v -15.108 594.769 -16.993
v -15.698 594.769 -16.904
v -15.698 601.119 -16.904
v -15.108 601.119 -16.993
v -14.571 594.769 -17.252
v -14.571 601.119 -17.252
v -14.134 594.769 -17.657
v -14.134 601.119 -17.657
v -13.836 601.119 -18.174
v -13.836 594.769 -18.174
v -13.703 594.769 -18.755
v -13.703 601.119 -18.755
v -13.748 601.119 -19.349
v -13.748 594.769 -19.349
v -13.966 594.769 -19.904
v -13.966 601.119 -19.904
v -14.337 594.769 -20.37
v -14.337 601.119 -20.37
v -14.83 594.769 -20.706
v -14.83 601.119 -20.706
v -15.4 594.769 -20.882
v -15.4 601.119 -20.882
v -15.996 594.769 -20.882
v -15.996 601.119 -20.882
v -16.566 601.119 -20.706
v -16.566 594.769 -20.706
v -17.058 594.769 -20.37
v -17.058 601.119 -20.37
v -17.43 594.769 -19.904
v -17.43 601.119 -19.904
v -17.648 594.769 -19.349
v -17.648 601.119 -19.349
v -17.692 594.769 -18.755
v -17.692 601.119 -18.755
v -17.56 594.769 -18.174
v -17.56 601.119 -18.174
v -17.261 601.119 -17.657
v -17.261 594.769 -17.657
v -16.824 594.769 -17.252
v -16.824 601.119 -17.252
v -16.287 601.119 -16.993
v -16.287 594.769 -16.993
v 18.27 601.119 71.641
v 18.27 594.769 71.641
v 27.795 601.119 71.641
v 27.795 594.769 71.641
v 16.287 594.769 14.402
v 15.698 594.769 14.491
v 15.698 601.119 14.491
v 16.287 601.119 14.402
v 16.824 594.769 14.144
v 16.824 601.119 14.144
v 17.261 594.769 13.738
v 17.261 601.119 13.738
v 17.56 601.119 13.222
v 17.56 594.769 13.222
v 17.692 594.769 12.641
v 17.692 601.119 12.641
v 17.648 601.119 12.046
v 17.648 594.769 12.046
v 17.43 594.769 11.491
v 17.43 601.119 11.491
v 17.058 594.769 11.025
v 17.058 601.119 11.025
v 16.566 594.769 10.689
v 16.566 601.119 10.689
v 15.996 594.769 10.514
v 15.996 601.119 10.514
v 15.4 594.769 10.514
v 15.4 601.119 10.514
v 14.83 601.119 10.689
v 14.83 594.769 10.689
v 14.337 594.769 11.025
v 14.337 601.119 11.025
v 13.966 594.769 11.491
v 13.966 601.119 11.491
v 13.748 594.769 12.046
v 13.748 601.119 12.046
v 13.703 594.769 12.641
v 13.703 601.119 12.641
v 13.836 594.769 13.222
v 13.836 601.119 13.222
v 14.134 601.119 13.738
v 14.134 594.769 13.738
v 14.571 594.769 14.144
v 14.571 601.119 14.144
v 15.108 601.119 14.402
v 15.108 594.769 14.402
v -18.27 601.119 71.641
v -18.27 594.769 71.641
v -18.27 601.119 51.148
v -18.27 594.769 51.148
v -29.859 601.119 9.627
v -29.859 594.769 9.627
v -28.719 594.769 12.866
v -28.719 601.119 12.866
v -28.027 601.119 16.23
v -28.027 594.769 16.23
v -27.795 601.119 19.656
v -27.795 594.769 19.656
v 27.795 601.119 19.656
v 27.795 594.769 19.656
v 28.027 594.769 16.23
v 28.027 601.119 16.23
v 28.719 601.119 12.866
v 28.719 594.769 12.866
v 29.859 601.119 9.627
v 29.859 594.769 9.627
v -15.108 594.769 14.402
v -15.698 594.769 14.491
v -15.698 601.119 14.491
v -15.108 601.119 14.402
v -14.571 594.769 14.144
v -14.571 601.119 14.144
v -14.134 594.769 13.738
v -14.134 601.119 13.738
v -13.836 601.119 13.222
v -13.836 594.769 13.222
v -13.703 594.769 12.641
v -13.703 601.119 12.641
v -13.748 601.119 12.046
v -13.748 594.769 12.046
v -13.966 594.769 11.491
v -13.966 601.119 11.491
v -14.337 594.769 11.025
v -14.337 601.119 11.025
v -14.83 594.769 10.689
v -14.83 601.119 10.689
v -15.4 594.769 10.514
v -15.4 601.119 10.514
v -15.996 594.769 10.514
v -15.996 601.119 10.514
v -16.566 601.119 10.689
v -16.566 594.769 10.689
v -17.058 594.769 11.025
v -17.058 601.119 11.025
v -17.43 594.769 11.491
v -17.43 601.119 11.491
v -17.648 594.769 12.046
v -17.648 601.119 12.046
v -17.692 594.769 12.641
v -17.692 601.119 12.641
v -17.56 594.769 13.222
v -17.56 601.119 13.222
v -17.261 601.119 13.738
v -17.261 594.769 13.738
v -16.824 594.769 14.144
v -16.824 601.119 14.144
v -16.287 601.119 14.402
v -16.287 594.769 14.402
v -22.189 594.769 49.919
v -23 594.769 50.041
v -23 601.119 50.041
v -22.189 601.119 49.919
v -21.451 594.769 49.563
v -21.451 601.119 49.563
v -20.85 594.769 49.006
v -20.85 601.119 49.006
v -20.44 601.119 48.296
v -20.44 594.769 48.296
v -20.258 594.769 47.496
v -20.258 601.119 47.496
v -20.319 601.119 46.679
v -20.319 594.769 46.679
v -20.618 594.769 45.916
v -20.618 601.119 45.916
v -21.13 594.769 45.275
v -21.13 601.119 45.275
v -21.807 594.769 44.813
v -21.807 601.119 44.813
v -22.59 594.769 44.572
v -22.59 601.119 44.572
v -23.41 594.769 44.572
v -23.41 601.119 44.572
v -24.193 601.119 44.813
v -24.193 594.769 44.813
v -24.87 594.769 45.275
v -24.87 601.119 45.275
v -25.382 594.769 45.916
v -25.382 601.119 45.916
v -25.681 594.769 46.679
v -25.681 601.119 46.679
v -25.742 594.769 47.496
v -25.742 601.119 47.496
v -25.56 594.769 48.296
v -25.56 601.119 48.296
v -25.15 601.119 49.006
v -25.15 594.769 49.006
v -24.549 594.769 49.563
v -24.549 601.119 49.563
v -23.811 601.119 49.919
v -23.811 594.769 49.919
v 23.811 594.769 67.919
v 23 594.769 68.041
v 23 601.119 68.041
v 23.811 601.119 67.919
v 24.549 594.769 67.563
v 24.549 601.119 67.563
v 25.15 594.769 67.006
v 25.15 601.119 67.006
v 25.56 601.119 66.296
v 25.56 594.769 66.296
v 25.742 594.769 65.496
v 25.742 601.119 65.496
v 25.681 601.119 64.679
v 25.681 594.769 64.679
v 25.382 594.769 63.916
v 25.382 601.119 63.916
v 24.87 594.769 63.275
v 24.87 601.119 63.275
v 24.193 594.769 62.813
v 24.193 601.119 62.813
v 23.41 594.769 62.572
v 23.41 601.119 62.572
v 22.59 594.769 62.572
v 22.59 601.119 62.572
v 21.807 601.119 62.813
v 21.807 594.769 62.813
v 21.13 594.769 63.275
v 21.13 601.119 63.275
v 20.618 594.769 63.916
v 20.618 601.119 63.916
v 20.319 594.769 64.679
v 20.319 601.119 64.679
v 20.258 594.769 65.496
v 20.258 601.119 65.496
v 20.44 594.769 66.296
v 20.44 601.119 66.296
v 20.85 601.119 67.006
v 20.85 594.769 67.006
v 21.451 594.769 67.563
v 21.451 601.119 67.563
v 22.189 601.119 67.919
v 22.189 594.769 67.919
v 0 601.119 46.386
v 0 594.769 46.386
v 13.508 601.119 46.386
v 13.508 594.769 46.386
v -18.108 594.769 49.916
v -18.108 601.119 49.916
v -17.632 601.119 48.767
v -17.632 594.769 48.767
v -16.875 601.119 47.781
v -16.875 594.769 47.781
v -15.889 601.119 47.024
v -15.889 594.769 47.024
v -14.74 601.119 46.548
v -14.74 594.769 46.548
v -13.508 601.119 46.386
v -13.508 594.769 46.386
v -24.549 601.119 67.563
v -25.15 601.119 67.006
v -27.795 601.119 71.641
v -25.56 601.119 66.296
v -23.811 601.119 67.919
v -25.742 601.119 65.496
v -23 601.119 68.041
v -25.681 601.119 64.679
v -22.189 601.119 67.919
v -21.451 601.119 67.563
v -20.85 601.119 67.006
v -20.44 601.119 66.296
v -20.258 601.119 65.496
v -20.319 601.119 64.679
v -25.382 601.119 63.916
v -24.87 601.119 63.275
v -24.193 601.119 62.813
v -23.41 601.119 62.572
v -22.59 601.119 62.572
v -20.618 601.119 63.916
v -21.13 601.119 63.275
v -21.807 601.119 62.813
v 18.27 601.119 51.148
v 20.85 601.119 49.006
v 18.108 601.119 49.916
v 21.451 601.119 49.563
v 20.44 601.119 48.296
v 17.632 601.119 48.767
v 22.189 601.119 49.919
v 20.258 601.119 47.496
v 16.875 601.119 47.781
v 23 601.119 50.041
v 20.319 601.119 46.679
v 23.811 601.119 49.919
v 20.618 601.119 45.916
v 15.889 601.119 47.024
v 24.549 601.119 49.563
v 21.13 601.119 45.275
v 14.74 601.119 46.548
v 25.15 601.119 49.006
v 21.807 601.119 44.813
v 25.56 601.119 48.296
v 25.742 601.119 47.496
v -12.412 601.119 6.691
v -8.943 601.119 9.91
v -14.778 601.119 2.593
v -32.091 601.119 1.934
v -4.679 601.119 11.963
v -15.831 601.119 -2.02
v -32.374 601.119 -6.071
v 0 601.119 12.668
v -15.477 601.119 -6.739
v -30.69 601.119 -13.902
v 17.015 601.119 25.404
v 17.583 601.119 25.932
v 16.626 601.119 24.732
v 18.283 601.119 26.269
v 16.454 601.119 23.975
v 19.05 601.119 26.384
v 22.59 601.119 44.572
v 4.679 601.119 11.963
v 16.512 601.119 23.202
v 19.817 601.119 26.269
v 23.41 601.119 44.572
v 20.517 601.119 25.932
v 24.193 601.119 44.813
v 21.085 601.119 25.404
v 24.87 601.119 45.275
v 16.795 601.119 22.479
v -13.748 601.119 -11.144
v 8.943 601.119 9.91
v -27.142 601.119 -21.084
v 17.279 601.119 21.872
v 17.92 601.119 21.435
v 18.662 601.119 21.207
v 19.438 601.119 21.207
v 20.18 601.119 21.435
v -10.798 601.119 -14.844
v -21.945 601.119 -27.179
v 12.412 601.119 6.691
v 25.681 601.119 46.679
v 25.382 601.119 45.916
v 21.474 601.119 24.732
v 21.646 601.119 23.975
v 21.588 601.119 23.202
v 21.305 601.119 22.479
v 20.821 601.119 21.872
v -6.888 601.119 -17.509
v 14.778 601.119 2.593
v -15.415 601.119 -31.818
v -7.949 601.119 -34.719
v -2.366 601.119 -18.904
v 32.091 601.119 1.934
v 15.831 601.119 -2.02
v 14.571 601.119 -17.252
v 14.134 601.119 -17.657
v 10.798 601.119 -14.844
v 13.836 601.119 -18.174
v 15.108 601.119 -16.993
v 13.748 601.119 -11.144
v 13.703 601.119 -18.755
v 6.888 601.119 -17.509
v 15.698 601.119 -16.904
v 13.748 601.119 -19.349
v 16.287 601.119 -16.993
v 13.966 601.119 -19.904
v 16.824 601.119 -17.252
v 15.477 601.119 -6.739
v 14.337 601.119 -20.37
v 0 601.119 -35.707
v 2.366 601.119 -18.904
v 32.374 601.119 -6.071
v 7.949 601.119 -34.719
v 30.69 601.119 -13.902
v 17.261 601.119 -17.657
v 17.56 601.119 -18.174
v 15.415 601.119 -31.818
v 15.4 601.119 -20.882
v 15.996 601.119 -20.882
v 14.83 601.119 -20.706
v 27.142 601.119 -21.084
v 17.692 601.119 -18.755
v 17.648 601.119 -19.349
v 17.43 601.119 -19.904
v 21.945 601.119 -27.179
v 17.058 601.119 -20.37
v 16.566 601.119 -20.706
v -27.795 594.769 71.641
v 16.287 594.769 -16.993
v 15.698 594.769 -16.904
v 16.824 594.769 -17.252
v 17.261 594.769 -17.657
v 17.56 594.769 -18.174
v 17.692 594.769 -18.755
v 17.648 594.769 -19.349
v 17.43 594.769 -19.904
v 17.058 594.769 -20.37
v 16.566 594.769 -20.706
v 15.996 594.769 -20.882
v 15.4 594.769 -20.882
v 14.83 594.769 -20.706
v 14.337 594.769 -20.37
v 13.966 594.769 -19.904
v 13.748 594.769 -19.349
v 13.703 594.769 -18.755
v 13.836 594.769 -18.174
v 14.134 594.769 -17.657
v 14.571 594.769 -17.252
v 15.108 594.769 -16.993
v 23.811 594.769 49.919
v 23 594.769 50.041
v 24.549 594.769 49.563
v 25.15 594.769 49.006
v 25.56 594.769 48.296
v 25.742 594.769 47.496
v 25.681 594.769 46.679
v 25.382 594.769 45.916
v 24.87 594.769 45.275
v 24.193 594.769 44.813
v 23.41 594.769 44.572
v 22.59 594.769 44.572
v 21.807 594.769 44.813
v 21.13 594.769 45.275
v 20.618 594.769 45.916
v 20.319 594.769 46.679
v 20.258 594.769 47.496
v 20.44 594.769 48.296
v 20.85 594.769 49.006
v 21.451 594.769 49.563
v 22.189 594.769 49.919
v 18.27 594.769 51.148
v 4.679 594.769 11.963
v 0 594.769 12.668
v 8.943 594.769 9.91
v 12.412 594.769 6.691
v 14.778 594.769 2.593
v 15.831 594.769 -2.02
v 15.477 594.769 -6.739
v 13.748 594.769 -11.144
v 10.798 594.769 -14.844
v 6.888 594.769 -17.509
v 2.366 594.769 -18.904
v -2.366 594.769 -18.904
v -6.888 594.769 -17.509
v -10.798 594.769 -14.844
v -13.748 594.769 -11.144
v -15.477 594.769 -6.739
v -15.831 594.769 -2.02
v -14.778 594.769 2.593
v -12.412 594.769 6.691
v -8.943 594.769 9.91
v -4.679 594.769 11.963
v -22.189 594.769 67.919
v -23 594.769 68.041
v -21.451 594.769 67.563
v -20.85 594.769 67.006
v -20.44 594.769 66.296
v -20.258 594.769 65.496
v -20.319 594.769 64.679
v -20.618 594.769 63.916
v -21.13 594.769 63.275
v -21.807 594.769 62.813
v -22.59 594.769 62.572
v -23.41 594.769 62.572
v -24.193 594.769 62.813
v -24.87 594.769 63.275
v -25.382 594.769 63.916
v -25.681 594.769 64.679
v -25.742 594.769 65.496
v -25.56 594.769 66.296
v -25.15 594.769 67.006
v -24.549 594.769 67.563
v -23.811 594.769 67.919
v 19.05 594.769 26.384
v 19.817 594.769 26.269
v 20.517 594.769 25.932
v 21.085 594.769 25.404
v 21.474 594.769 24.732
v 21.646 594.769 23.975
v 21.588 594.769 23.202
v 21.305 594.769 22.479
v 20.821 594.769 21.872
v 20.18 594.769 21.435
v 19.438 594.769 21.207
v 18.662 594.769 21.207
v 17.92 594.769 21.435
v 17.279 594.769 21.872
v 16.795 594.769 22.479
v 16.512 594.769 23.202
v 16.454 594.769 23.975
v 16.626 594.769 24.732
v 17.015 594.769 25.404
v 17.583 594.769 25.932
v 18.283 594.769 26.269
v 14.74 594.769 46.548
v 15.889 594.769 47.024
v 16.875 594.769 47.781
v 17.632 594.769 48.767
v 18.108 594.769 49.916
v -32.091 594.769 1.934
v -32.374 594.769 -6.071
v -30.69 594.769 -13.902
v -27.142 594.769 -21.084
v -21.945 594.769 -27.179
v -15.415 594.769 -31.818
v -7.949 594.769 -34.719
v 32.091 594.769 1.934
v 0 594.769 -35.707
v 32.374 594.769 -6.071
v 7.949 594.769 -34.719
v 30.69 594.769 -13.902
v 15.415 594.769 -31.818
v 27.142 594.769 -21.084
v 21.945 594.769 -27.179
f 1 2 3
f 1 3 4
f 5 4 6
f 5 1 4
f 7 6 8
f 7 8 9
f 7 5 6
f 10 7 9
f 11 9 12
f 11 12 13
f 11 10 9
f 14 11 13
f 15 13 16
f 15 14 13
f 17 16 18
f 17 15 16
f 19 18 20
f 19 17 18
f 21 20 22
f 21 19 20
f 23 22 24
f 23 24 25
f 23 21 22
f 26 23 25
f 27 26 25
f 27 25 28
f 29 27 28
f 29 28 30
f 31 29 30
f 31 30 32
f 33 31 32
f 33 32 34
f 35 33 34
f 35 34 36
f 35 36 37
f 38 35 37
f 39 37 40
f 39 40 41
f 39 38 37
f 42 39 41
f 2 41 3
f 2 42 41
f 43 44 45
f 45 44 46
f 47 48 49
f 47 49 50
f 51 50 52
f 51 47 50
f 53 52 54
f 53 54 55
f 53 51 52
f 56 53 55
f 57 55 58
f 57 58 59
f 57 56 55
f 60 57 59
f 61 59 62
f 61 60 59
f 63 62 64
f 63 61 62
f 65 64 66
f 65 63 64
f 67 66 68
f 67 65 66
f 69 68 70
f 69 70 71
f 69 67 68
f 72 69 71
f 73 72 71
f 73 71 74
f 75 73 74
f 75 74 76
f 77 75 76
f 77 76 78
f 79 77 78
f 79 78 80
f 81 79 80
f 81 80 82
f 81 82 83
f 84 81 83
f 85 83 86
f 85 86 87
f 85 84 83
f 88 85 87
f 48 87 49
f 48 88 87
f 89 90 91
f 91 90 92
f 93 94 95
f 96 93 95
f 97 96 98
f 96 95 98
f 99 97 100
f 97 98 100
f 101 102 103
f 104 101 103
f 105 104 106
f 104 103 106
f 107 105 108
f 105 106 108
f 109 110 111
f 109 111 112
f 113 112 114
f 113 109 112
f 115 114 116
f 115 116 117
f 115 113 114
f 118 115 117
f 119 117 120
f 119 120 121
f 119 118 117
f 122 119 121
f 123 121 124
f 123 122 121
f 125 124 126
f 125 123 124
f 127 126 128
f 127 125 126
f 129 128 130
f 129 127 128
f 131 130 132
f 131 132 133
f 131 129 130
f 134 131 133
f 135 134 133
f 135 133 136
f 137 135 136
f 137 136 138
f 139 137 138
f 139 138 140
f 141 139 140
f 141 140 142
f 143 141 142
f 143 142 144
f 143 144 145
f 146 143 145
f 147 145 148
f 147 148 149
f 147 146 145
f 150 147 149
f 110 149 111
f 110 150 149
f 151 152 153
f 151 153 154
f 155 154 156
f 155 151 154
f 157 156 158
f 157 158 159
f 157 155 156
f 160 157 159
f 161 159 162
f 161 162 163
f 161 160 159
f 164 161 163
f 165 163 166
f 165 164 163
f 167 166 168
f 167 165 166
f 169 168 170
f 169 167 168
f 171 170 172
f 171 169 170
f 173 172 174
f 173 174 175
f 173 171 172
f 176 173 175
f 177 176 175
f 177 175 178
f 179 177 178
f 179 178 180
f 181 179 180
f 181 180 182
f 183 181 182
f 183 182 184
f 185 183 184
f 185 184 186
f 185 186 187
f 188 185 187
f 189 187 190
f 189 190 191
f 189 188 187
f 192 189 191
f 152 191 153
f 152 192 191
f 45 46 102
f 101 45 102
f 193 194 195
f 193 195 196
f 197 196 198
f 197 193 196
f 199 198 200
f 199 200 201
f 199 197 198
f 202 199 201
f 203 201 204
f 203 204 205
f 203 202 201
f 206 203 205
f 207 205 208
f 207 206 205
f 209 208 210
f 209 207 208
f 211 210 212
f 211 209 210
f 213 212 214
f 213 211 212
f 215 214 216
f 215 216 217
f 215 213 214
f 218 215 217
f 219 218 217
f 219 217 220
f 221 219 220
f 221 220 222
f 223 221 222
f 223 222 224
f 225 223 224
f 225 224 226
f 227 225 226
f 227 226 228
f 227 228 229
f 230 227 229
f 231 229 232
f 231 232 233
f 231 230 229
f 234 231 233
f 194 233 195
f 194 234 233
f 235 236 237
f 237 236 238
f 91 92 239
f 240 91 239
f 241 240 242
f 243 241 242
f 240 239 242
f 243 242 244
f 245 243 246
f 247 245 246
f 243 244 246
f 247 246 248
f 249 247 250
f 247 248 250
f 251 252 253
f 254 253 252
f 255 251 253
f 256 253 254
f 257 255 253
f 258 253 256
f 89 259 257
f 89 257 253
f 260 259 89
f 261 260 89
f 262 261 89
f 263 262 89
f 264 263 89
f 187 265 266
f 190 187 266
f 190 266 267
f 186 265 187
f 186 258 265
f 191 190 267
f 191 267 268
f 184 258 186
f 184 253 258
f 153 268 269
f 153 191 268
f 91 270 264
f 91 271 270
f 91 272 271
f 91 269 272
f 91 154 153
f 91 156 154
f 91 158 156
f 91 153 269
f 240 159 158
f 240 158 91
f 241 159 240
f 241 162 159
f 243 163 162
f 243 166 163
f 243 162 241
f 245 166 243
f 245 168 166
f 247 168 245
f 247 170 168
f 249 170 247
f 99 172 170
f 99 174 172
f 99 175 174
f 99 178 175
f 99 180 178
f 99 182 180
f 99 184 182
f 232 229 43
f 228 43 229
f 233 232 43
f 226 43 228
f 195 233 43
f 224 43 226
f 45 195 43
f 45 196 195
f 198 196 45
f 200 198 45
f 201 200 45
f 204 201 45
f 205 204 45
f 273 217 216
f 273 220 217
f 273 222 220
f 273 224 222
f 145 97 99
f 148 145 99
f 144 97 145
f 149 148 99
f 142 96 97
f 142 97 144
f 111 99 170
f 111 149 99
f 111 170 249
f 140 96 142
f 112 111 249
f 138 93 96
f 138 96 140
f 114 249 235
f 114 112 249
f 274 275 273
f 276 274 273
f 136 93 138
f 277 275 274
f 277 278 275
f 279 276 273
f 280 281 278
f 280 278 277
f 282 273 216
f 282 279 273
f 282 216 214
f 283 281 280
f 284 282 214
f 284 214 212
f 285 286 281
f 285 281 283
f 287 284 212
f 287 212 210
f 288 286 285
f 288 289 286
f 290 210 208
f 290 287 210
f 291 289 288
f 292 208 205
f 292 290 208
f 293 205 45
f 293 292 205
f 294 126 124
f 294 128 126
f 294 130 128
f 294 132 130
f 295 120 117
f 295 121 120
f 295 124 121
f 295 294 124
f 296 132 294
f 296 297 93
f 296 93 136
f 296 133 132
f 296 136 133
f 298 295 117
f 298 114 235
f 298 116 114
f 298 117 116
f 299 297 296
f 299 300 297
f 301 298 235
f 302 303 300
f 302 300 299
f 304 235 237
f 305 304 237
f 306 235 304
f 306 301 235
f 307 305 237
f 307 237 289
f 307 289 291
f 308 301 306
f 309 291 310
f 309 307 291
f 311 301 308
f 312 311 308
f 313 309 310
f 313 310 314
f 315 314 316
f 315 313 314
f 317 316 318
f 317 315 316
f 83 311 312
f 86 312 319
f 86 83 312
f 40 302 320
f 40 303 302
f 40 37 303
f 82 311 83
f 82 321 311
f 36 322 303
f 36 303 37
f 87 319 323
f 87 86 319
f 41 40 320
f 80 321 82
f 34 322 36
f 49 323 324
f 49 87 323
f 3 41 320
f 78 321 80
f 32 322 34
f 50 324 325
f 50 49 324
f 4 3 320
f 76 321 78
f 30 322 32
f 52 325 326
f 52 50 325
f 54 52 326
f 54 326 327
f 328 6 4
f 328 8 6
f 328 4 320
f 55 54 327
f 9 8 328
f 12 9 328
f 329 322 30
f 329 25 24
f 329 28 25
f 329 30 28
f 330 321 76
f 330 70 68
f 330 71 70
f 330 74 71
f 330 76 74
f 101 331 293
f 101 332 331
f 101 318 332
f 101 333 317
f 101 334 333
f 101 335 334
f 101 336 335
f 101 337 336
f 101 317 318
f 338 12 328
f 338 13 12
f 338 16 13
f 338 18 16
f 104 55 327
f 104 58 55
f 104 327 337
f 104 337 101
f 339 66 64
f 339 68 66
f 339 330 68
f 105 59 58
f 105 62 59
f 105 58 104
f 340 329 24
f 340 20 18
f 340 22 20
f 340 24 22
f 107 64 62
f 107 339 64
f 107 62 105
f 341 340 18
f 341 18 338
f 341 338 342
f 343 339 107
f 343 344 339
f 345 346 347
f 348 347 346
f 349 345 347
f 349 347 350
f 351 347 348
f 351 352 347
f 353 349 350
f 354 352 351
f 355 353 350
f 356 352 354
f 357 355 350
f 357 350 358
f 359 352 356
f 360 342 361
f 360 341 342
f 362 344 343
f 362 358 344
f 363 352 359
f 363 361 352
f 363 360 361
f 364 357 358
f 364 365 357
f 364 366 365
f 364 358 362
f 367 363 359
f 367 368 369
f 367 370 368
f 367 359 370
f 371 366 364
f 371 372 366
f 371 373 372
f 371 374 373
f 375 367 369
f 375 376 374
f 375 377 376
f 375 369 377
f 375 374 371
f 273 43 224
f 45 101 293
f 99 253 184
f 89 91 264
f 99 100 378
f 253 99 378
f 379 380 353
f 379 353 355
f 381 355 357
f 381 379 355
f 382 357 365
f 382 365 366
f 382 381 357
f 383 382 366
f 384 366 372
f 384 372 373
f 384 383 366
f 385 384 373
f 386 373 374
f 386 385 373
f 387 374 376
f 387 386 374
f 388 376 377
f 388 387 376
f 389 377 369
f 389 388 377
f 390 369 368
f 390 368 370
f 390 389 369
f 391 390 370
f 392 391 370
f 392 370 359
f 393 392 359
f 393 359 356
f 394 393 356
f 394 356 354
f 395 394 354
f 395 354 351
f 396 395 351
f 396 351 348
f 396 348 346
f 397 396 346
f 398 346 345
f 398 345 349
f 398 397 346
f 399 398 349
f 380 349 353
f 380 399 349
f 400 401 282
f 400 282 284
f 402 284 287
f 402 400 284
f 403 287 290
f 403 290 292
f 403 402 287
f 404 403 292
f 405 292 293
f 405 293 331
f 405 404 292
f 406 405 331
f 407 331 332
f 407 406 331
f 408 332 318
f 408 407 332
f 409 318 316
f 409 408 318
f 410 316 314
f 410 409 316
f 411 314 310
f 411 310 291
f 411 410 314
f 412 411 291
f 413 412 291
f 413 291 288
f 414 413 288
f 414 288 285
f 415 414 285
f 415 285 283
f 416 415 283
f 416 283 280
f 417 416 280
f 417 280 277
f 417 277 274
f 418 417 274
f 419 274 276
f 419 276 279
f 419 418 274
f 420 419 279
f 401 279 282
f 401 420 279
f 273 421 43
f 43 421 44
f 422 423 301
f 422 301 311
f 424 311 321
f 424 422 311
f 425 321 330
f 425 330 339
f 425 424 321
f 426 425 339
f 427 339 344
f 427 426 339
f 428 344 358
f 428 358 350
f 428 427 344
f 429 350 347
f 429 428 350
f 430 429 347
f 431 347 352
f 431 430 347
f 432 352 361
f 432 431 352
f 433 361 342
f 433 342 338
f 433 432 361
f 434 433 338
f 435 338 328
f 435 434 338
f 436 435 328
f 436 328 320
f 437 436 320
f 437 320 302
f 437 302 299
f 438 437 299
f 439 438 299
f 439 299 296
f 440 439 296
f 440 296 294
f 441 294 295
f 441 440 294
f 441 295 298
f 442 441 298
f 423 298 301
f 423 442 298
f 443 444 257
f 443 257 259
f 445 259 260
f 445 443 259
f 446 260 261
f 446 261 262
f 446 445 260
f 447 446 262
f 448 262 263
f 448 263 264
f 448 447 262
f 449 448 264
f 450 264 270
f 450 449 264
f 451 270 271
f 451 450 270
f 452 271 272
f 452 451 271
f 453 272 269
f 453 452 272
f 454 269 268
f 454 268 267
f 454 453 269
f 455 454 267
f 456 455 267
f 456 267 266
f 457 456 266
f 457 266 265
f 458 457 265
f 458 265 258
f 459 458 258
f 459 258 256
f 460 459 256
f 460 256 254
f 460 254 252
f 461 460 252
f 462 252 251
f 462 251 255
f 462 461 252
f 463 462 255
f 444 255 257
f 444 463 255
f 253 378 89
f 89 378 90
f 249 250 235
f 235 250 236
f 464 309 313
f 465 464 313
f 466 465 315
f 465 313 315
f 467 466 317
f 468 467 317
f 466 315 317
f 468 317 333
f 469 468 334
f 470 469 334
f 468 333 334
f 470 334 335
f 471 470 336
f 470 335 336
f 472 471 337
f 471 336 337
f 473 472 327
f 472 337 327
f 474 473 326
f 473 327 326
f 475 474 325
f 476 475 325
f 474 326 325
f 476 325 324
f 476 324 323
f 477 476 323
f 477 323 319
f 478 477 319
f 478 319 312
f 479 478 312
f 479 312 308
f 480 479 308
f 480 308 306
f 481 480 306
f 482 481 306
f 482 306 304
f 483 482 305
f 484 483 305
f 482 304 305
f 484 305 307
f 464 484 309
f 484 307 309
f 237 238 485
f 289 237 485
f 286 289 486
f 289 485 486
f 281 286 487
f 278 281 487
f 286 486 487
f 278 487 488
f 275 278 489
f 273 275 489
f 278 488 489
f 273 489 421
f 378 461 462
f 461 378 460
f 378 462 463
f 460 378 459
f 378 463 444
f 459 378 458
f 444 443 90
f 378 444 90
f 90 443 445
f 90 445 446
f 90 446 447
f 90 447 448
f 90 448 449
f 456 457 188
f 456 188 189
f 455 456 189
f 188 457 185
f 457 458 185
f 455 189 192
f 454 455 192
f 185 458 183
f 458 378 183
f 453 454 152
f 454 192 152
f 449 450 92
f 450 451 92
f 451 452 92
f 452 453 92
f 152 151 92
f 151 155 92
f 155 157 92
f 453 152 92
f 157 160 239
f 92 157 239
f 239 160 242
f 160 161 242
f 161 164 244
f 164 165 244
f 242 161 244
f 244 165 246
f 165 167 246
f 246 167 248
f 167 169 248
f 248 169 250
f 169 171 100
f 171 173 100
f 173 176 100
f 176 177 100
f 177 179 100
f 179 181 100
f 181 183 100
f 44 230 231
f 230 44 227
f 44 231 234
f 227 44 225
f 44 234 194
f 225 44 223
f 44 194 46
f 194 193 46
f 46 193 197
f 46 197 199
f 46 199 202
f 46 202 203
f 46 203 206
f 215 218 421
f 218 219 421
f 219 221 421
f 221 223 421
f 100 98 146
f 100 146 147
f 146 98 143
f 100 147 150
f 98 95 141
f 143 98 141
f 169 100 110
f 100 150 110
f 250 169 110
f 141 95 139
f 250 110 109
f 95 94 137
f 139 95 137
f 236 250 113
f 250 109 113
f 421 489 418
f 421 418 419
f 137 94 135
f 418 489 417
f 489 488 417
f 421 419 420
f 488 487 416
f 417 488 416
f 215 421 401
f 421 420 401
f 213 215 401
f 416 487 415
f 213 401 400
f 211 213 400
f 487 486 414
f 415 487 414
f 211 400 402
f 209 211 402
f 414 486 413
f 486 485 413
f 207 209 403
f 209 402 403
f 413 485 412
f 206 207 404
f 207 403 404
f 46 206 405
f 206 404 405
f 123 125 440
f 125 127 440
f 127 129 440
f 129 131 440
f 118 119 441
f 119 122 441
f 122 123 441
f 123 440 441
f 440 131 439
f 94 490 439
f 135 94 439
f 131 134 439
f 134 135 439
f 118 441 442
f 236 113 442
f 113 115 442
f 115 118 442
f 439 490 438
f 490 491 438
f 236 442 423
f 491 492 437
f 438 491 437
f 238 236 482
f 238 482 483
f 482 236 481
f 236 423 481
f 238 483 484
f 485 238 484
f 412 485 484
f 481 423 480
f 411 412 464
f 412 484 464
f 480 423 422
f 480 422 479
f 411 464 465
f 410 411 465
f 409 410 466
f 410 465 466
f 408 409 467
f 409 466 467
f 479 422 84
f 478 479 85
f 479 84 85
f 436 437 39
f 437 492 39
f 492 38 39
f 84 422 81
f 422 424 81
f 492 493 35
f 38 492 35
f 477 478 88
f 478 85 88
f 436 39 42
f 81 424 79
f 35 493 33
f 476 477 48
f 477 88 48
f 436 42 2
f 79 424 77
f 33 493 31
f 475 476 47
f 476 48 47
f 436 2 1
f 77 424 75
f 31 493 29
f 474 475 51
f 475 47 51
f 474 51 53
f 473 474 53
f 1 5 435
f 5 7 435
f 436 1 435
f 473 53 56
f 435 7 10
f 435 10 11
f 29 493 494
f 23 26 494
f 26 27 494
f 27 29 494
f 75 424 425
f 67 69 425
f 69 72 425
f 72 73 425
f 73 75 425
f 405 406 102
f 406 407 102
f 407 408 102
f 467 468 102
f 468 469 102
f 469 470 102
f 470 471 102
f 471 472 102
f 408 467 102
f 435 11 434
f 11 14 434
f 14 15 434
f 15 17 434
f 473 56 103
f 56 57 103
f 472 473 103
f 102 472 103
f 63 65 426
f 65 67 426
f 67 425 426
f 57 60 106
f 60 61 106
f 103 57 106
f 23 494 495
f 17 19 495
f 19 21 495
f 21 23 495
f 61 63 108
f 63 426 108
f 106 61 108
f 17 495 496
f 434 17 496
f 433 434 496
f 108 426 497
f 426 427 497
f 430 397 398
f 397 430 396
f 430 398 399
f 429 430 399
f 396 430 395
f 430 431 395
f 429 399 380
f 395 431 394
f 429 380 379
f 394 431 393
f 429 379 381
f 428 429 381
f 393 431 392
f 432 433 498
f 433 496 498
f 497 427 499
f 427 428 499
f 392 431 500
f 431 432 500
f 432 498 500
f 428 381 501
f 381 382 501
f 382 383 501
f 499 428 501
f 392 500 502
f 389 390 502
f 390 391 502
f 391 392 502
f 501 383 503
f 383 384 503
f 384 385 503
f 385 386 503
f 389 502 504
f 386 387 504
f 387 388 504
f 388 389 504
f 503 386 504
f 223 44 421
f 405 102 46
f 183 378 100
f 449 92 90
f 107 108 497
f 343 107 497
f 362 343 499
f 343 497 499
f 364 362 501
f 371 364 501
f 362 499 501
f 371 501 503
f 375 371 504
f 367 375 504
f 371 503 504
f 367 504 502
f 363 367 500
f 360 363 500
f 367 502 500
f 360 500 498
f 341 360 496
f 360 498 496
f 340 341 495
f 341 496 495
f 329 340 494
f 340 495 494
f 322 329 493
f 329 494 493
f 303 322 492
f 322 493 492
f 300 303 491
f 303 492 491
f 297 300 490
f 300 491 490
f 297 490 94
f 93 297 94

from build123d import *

# Parameters (mm, degrees)
SKETCH1_R           = 2.75
SKETCH1_R_2         = 15.875
SKETCH1_R_3         = 1.999996
BOSS_EXTRUDE1_DEPTH = 6.35
SKETCH2_R           = 2.6035
CUT_EXTRUDE1_DEPTH  = 6.35


with BuildPart() as part:
    # Sketch1 → Boss-Extrude1 (new body)
    with BuildSketch(Plane(origin=(0, 594.769027045, 0), x_dir=(1, 0, 0), z_dir=(0, 1, 0))):
        with BuildLine():
            Line((18.270000003, -51.148426992), (18.270000003, -71.640926991))
            Line((18.270000003, -71.640926991), (27.795000003, -71.640926991))
            Line((27.795000003, -71.640926991), (27.795000003, -19.656099647))
            ThreePointArc((27.795000003, -19.656099647), (28.316356539, -14.536226662), (29.859023577, -9.626533144))
            ThreePointArc((29.859023577, -9.626533144), (0, 35.706571509), (-29.859023577, -9.626533144))
            ThreePointArc((-29.859023577, -9.626533144), (-28.316356539, -14.536226662), (-27.795000003, -19.656099647))
            Line((-27.795000003, -19.656099647), (-27.795000003, -71.640926991))
            Line((-27.795000003, -71.640926991), (-18.270000003, -71.640926991))
            Line((-18.270000003, -71.640926991), (-18.270000003, -51.148426992))
            ThreePointArc((-18.270000003, -51.148426992), (-16.875096049, -47.780830946), (-13.507500003, -46.385926992))
            Line((-13.507500003, -46.385926992), (0, -46.385926991))
            Line((0, -46.385926991), (13.507500003, -46.385926992))
            ThreePointArc((13.507500003, -46.385926992), (16.875096049, -47.780830946), (18.270000003, -51.148426992))
        make_face()
        with Locations(Location((-23, -65.290926991, 0), (0, 0, 270))):
            Circle(SKETCH1_R, mode=Mode.SUBTRACT)
        with Locations(Location((-23, -47.290926991, 0), (0, 0, 270))):
            Circle(SKETCH1_R, mode=Mode.SUBTRACT)
        with Locations(Location((23, -47.290926991, 0), (0, 0, 270))):
            Circle(SKETCH1_R, mode=Mode.SUBTRACT)
        with Locations(Location((23, -65.290926991, 0), (0, 0, 270))):
            Circle(SKETCH1_R, mode=Mode.SUBTRACT)
        with Locations(Location((0, 3.206573009, 0), (0, 0, 270))):
            Circle(SKETCH1_R_2, mode=Mode.SUBTRACT)
        with Locations(Location((-15.697770542, -12.491197534, 0), (0, 0, 270))):
            Circle(SKETCH1_R_3, mode=Mode.SUBTRACT)
        with Locations(Location((-15.697770542, 18.904343551, 0), (0, 0, 270))):
            Circle(SKETCH1_R_3, mode=Mode.SUBTRACT)
        with Locations(Location((15.697770542, 18.904343551, 0), (0, 0, 270))):
            Circle(SKETCH1_R_3, mode=Mode.SUBTRACT)
        with Locations(Location((15.697770542, -12.491197534, 0), (0, 0, 270))):
            Circle(SKETCH1_R_3, mode=Mode.SUBTRACT)
    extrude(amount=BOSS_EXTRUDE1_DEPTH)

    # Sketch2 → Cut-Extrude1 (cut)
    with BuildSketch(Plane(origin=(0, 601.119027045, 0), x_dir=(1, 0, 0), z_dir=(0, 1, 0))):
        with Locations(Location((19.05, -23.780926991, 0), (0, 0, 270))):
            Circle(SKETCH2_R)
    extrude(amount=-CUT_EXTRUDE1_DEPTH, mode=Mode.SUBTRACT)


solid = part.part
